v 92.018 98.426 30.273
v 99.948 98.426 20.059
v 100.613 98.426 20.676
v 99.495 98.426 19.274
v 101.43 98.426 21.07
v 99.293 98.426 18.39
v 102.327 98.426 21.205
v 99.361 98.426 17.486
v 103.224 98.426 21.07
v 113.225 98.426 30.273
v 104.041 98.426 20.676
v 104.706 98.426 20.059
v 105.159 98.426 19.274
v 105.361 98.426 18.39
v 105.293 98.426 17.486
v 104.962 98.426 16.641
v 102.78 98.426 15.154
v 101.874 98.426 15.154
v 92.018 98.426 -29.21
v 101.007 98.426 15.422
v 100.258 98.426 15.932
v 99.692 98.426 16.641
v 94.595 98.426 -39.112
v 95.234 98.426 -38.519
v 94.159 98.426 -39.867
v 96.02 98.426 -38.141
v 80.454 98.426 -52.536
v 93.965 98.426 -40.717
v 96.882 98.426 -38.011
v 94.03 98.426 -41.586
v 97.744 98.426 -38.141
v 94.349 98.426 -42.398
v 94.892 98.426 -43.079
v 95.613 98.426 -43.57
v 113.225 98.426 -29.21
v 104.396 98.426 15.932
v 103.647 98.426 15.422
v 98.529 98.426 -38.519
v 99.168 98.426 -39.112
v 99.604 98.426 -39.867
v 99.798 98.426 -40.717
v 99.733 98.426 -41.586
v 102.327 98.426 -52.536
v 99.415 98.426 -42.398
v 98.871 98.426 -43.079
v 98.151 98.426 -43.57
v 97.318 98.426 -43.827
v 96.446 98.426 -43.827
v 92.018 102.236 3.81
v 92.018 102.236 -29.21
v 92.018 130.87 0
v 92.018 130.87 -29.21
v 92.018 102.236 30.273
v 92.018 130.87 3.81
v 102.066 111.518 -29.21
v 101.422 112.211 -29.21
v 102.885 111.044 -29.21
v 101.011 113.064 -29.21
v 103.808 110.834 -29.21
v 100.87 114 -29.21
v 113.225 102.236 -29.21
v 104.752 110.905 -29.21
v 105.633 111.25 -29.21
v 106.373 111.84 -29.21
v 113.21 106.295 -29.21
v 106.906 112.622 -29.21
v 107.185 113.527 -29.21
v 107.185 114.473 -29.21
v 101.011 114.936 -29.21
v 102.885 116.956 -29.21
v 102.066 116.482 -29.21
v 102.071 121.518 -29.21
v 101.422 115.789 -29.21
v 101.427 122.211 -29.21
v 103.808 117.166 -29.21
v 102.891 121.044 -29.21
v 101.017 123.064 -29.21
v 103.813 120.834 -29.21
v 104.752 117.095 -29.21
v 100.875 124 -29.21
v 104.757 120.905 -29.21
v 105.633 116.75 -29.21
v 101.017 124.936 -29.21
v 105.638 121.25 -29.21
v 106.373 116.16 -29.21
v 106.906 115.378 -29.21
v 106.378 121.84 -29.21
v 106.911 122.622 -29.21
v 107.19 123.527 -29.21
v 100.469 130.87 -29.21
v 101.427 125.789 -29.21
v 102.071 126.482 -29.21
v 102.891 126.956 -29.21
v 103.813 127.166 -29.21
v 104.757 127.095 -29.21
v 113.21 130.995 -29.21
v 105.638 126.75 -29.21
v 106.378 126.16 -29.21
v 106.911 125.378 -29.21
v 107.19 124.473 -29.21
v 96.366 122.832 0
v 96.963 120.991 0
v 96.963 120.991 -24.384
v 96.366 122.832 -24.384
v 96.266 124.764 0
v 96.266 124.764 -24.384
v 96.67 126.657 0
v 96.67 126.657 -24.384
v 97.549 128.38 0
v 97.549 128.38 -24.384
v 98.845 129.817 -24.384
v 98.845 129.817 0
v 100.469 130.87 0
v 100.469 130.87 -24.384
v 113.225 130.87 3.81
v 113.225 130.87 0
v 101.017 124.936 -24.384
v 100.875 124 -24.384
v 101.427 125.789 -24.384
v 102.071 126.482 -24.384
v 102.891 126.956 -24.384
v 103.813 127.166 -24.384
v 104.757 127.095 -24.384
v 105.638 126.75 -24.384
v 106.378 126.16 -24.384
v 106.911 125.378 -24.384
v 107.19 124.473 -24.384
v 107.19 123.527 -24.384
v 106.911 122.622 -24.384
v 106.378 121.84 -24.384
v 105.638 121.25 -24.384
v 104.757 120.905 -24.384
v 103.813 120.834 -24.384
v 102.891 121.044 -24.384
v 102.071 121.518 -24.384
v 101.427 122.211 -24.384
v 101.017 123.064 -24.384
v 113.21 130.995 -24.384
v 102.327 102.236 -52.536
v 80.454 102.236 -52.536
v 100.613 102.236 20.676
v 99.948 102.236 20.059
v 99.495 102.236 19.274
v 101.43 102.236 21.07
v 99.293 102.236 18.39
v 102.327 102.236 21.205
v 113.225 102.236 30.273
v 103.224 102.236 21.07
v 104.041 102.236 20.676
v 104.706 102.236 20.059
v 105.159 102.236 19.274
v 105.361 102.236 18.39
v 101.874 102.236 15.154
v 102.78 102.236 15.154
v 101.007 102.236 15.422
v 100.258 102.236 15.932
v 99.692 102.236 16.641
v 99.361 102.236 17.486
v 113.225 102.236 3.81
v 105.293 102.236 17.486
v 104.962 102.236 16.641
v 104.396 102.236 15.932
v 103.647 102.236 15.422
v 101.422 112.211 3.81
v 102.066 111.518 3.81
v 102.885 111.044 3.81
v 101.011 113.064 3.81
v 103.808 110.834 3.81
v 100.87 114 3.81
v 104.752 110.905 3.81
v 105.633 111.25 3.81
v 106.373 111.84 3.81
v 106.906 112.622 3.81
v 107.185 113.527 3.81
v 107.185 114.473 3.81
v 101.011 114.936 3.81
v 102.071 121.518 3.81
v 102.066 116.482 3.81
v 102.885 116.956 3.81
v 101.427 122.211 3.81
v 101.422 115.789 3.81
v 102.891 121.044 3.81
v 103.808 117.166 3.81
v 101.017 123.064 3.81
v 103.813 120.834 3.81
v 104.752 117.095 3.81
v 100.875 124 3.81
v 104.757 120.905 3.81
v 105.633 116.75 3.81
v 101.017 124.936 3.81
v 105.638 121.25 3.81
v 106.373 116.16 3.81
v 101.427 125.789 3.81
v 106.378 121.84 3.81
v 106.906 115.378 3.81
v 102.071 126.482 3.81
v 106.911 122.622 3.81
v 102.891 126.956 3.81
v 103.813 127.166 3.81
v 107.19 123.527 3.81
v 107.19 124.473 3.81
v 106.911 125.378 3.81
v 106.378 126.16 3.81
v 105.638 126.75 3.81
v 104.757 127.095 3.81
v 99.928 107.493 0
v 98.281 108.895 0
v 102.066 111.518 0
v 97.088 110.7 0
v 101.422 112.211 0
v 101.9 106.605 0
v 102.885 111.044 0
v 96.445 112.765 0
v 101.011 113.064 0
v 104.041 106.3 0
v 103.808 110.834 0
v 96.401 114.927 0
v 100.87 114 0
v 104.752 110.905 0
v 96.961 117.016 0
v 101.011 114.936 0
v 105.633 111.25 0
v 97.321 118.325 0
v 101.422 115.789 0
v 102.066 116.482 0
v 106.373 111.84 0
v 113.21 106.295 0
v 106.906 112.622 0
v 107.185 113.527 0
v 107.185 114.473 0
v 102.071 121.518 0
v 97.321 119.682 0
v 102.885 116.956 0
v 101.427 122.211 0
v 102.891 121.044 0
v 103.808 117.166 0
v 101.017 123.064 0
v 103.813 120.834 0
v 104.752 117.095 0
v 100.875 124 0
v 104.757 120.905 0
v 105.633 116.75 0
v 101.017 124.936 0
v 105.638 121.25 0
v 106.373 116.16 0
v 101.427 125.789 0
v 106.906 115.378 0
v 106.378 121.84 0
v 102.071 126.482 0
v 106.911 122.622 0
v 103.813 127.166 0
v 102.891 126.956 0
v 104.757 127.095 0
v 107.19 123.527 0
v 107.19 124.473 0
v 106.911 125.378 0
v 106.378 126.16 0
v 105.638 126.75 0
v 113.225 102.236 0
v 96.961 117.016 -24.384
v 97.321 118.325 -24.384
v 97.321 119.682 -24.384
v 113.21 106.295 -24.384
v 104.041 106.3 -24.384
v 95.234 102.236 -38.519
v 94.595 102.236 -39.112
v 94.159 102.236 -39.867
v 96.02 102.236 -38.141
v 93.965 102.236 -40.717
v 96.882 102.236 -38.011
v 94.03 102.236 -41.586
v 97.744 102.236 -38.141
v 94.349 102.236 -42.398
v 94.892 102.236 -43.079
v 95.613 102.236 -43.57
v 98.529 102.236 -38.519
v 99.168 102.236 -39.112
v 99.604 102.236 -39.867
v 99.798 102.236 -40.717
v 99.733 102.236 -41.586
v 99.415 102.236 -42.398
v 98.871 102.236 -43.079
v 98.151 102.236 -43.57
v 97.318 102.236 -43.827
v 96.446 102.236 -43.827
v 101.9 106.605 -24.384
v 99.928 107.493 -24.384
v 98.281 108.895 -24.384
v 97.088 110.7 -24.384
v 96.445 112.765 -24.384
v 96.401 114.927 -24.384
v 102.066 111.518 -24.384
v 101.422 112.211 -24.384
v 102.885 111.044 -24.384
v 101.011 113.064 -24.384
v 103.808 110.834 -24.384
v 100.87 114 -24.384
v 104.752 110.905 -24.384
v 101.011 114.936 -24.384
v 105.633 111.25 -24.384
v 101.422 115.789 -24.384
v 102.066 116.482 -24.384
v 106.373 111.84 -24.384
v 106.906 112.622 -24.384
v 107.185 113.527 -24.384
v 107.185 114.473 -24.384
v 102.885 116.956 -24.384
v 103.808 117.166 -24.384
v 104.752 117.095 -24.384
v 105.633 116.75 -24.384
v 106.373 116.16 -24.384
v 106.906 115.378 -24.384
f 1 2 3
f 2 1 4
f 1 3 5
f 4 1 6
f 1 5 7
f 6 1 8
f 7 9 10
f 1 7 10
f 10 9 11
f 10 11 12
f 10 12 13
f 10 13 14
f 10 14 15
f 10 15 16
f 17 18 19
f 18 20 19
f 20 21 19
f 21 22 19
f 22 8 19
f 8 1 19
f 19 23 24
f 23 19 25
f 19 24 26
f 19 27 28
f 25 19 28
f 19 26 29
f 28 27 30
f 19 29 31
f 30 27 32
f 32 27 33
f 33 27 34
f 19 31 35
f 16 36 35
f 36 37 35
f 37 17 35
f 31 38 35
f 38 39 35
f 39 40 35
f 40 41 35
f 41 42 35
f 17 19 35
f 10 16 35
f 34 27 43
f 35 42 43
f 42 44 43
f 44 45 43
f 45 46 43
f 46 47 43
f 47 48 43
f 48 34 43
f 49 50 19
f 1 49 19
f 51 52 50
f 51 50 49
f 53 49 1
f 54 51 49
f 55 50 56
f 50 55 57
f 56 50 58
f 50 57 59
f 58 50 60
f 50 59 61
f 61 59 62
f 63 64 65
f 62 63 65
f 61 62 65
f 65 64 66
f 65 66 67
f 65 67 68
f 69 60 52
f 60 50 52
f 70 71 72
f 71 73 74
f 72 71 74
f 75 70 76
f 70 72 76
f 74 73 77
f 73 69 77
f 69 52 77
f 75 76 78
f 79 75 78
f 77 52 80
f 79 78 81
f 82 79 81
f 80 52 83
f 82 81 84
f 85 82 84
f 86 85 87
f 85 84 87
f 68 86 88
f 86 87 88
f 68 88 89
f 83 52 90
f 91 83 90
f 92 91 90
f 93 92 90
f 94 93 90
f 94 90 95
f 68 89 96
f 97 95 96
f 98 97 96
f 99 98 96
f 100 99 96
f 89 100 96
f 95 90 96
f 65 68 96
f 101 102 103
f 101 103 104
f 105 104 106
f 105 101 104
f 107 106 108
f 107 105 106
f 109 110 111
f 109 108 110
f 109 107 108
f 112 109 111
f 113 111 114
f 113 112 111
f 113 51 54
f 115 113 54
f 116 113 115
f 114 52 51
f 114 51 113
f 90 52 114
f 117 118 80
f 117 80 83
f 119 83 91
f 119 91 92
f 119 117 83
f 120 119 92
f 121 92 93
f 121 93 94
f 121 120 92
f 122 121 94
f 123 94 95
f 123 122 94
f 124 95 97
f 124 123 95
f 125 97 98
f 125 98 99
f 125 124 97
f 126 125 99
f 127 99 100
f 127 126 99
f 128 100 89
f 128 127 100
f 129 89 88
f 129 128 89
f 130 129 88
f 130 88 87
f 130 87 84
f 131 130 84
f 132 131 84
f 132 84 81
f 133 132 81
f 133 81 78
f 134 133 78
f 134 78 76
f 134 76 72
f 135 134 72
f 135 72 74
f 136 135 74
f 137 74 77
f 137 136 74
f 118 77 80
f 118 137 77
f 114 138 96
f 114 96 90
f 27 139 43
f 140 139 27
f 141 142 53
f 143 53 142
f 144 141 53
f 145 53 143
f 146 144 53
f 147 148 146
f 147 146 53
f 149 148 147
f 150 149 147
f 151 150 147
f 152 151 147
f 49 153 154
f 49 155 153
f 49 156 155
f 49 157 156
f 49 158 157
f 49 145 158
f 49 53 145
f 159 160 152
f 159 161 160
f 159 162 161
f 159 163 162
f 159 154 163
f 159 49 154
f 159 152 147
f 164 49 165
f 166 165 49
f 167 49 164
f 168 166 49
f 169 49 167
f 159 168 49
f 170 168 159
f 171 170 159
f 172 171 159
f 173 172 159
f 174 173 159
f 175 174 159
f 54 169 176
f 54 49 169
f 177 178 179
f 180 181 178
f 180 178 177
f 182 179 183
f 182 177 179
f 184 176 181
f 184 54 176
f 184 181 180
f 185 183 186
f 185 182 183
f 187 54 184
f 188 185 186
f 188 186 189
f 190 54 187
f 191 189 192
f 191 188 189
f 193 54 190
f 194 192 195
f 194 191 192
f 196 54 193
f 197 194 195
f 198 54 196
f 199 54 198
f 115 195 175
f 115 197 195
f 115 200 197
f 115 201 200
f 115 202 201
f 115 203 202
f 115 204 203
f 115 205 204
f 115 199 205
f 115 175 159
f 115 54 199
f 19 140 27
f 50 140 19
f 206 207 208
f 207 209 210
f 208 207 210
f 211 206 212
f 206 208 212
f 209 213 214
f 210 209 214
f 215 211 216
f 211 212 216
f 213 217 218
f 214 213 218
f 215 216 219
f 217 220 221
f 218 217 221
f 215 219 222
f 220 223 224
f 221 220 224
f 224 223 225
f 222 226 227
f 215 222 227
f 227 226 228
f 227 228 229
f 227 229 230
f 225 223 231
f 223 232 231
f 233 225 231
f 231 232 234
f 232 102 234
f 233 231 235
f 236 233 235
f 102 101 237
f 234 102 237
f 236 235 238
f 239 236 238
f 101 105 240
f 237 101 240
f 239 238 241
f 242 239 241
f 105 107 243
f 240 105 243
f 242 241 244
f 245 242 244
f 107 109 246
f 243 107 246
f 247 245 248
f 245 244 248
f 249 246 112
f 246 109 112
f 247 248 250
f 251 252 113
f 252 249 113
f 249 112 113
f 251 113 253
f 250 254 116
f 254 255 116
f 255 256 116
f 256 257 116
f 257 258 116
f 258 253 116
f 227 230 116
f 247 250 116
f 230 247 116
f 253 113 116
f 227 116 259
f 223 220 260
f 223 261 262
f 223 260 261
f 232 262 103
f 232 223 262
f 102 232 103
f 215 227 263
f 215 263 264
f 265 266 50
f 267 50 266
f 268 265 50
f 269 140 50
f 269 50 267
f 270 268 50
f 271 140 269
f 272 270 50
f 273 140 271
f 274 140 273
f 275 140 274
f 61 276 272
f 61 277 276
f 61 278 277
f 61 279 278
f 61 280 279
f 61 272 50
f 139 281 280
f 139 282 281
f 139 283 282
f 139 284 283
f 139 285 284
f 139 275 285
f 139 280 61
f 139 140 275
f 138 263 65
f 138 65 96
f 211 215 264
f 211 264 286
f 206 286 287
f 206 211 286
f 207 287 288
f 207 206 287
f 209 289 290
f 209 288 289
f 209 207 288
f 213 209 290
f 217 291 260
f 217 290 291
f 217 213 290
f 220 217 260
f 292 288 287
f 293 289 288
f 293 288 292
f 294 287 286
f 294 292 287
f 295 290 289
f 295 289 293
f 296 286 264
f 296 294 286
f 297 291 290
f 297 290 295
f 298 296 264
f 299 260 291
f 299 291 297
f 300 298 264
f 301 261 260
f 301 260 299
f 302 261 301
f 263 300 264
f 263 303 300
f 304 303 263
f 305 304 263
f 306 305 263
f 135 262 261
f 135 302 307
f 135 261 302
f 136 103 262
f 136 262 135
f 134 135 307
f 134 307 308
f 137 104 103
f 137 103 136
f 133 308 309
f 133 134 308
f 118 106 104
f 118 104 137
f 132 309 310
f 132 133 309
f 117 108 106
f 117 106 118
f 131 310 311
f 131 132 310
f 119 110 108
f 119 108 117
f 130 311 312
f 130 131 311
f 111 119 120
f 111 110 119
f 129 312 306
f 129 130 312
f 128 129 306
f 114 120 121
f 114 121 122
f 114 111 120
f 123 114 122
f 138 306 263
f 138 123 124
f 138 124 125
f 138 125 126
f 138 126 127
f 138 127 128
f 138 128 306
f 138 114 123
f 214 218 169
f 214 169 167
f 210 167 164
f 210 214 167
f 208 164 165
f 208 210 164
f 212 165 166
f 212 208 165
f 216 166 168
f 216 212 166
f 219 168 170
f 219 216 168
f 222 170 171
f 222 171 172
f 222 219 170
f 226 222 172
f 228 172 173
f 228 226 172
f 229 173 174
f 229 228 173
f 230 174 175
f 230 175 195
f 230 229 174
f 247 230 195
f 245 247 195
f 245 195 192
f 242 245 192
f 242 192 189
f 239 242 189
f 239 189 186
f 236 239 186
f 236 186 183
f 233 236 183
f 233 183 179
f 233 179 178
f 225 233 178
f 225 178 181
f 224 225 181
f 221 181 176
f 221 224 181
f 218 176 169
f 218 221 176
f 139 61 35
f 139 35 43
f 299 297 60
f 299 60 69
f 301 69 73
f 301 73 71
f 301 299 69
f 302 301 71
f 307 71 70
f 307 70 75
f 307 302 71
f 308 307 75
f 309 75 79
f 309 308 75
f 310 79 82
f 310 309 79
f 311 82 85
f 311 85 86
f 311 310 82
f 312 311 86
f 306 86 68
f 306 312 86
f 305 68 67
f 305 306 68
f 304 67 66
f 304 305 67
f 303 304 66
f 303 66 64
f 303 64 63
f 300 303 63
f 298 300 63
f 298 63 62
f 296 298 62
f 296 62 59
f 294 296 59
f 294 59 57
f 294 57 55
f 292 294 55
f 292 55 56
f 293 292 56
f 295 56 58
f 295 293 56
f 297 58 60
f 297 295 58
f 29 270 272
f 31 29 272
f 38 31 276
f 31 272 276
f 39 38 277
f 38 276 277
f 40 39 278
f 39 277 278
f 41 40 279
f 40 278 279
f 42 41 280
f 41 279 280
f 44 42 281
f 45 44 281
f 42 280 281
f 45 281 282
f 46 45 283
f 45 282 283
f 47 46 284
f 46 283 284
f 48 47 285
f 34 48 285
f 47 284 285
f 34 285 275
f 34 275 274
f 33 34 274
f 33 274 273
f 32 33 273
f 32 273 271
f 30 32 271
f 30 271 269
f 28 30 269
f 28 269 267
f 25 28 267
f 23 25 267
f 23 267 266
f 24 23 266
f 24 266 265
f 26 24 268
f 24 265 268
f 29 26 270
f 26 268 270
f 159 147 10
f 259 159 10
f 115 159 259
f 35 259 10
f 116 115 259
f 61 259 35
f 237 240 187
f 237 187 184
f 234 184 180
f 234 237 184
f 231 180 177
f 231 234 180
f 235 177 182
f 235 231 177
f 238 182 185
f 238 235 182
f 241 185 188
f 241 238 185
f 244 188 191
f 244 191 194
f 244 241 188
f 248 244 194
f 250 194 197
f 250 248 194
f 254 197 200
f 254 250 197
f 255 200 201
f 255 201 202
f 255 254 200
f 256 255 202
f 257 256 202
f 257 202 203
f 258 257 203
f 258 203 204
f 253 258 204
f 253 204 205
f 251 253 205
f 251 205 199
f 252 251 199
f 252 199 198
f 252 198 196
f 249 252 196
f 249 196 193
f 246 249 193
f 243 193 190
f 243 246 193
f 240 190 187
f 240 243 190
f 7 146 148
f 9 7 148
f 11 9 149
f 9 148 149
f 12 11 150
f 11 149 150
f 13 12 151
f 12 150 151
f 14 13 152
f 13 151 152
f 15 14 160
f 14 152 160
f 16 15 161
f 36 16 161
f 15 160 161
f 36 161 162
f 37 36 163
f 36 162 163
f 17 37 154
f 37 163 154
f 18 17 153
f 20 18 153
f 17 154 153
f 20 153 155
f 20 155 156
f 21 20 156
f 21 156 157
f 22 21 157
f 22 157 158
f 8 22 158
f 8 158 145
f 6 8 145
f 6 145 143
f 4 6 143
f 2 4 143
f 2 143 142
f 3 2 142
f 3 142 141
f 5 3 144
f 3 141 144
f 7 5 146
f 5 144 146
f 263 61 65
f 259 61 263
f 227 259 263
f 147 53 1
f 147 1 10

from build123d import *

# Parameters (mm, degrees)
BOSS_EXTRUDE1_DEPTH = 29.21
SKETCH2_W           = 21.206924152
SKETCH2_H           = 28.633723015
SKETCH2_R           = 3.175
BOSS_EXTRUDE2_DEPTH = 3.81
BOSS_EXTRUDE3_START = -4.826
SKETCH3_R           = 3.175
BOSS_EXTRUDE3_DEPTH = 4.826
SKETCH4_R           = 2.924709064
SKETCH4_R_2         = 3.042286042
BOSS_EXTRUDE4_DEPTH = 3.81


with BuildPart() as part:
    # Sketch1 → Boss-Extrude1 (new body)
    with BuildSketch(Plane.XY):
        with BuildLine():
            Line((92.017977945, 102.236000374), (113.224902097, 102.236000374))
            Line((113.224902097, 102.236000374), (113.210298678, 106.295173442))
            Line((113.210298678, 106.295173442), (104.041152894, 106.300000374))
            ThreePointArc((104.041152894, 106.300000374), (97.620882741, 109.755229578), (96.960558709, 117.016252224))
            ThreePointArc((96.960558709, 117.016252224), (97.366531104, 119.0035195), (96.962652269, 120.991213315))
            ThreePointArc((96.962652269, 120.991213315), (96.669783853, 126.656600471), (100.468728286, 130.869723389))
            Line((100.468728286, 130.869723389), (92.017977945, 130.869723389))
            Line((92.017977945, 130.869723389), (92.017977945, 102.236000374))
        make_face()
    extrude(amount=-BOSS_EXTRUDE1_DEPTH)

    # Sketch2 → Boss-Extrude2 (add)
    with BuildSketch(Plane.XY):
        with Locations((102.621440021, 116.552861882)):
            Rectangle(SKETCH2_W, SKETCH2_H)
        with Locations(Location((104.05047074, 124, 0), (0, 0, 180))):
            Circle(SKETCH2_R, mode=Mode.SUBTRACT)
        with Locations(Location((104.04520642, 114, 0), (0, 0, 180))):
            Circle(SKETCH2_R, mode=Mode.SUBTRACT)
    extrude(amount=BOSS_EXTRUDE2_DEPTH)

    # Sketch3 → Boss-Extrude3 (add)
    with BuildSketch(Plane(origin=(0, 0, -29.21), x_dir=(-1, 0, 0), z_dir=(0, 0, -1)).offset(BOSS_EXTRUDE3_START)):
        with BuildLine():
            Line((-113.210298678, 106.295173442), (-113.210298678, 130.994991711))
            Line((-113.210298678, 130.994991711), (-100.468728286, 130.869723389))
            ThreePointArc((-100.468728286, 130.869723389), (-96.669783853, 126.656600471), (-96.962652269, 120.991213315))
            ThreePointArc((-96.962652269, 120.991213315), (-97.366531104, 119.0035195), (-96.960558709, 117.016252224))
            ThreePointArc((-96.960558709, 117.016252224), (-97.620882741, 109.755229578), (-104.041152894, 106.300000374))
            Line((-104.041152894, 106.300000374), (-113.210298678, 106.295173442))
        make_face()
        with Locations((-104.04520642, 114)):
            Circle(SKETCH3_R, mode=Mode.SUBTRACT)
        with Locations((-104.05047074, 124)):
            Circle(SKETCH3_R, mode=Mode.SUBTRACT)
    extrude(amount=BOSS_EXTRUDE3_DEPTH)

    # Sketch4 → Boss-Extrude4 (add)
    with BuildSketch(Plane(origin=(0, 102.236000374, 0), x_dir=(1, 0, 0), z_dir=(0, 1, 0))):
        Polygon((92.017977945, -3.81), (92.017977945, -30.273157469), (113.224902097, -30.273157469), (113.224902097, -3.81), (113.224902097, 29.21), (102.326996441, 52.536371302), (80.454002019, 52.536371302), (92.017977945, 29.21), align=None)
        with Locations(Location((96.881668056, 40.935379723, 0), (0, 0, 270))):
            Circle(SKETCH4_R, mode=Mode.SUBTRACT)
        with Locations(Location((102.326996441, -18.162627323, 0), (0, 0, 270))):
            Circle(SKETCH4_R_2, mode=Mode.SUBTRACT)
    extrude(amount=-BOSS_EXTRUDE4_DEPTH)


solid = part.part
